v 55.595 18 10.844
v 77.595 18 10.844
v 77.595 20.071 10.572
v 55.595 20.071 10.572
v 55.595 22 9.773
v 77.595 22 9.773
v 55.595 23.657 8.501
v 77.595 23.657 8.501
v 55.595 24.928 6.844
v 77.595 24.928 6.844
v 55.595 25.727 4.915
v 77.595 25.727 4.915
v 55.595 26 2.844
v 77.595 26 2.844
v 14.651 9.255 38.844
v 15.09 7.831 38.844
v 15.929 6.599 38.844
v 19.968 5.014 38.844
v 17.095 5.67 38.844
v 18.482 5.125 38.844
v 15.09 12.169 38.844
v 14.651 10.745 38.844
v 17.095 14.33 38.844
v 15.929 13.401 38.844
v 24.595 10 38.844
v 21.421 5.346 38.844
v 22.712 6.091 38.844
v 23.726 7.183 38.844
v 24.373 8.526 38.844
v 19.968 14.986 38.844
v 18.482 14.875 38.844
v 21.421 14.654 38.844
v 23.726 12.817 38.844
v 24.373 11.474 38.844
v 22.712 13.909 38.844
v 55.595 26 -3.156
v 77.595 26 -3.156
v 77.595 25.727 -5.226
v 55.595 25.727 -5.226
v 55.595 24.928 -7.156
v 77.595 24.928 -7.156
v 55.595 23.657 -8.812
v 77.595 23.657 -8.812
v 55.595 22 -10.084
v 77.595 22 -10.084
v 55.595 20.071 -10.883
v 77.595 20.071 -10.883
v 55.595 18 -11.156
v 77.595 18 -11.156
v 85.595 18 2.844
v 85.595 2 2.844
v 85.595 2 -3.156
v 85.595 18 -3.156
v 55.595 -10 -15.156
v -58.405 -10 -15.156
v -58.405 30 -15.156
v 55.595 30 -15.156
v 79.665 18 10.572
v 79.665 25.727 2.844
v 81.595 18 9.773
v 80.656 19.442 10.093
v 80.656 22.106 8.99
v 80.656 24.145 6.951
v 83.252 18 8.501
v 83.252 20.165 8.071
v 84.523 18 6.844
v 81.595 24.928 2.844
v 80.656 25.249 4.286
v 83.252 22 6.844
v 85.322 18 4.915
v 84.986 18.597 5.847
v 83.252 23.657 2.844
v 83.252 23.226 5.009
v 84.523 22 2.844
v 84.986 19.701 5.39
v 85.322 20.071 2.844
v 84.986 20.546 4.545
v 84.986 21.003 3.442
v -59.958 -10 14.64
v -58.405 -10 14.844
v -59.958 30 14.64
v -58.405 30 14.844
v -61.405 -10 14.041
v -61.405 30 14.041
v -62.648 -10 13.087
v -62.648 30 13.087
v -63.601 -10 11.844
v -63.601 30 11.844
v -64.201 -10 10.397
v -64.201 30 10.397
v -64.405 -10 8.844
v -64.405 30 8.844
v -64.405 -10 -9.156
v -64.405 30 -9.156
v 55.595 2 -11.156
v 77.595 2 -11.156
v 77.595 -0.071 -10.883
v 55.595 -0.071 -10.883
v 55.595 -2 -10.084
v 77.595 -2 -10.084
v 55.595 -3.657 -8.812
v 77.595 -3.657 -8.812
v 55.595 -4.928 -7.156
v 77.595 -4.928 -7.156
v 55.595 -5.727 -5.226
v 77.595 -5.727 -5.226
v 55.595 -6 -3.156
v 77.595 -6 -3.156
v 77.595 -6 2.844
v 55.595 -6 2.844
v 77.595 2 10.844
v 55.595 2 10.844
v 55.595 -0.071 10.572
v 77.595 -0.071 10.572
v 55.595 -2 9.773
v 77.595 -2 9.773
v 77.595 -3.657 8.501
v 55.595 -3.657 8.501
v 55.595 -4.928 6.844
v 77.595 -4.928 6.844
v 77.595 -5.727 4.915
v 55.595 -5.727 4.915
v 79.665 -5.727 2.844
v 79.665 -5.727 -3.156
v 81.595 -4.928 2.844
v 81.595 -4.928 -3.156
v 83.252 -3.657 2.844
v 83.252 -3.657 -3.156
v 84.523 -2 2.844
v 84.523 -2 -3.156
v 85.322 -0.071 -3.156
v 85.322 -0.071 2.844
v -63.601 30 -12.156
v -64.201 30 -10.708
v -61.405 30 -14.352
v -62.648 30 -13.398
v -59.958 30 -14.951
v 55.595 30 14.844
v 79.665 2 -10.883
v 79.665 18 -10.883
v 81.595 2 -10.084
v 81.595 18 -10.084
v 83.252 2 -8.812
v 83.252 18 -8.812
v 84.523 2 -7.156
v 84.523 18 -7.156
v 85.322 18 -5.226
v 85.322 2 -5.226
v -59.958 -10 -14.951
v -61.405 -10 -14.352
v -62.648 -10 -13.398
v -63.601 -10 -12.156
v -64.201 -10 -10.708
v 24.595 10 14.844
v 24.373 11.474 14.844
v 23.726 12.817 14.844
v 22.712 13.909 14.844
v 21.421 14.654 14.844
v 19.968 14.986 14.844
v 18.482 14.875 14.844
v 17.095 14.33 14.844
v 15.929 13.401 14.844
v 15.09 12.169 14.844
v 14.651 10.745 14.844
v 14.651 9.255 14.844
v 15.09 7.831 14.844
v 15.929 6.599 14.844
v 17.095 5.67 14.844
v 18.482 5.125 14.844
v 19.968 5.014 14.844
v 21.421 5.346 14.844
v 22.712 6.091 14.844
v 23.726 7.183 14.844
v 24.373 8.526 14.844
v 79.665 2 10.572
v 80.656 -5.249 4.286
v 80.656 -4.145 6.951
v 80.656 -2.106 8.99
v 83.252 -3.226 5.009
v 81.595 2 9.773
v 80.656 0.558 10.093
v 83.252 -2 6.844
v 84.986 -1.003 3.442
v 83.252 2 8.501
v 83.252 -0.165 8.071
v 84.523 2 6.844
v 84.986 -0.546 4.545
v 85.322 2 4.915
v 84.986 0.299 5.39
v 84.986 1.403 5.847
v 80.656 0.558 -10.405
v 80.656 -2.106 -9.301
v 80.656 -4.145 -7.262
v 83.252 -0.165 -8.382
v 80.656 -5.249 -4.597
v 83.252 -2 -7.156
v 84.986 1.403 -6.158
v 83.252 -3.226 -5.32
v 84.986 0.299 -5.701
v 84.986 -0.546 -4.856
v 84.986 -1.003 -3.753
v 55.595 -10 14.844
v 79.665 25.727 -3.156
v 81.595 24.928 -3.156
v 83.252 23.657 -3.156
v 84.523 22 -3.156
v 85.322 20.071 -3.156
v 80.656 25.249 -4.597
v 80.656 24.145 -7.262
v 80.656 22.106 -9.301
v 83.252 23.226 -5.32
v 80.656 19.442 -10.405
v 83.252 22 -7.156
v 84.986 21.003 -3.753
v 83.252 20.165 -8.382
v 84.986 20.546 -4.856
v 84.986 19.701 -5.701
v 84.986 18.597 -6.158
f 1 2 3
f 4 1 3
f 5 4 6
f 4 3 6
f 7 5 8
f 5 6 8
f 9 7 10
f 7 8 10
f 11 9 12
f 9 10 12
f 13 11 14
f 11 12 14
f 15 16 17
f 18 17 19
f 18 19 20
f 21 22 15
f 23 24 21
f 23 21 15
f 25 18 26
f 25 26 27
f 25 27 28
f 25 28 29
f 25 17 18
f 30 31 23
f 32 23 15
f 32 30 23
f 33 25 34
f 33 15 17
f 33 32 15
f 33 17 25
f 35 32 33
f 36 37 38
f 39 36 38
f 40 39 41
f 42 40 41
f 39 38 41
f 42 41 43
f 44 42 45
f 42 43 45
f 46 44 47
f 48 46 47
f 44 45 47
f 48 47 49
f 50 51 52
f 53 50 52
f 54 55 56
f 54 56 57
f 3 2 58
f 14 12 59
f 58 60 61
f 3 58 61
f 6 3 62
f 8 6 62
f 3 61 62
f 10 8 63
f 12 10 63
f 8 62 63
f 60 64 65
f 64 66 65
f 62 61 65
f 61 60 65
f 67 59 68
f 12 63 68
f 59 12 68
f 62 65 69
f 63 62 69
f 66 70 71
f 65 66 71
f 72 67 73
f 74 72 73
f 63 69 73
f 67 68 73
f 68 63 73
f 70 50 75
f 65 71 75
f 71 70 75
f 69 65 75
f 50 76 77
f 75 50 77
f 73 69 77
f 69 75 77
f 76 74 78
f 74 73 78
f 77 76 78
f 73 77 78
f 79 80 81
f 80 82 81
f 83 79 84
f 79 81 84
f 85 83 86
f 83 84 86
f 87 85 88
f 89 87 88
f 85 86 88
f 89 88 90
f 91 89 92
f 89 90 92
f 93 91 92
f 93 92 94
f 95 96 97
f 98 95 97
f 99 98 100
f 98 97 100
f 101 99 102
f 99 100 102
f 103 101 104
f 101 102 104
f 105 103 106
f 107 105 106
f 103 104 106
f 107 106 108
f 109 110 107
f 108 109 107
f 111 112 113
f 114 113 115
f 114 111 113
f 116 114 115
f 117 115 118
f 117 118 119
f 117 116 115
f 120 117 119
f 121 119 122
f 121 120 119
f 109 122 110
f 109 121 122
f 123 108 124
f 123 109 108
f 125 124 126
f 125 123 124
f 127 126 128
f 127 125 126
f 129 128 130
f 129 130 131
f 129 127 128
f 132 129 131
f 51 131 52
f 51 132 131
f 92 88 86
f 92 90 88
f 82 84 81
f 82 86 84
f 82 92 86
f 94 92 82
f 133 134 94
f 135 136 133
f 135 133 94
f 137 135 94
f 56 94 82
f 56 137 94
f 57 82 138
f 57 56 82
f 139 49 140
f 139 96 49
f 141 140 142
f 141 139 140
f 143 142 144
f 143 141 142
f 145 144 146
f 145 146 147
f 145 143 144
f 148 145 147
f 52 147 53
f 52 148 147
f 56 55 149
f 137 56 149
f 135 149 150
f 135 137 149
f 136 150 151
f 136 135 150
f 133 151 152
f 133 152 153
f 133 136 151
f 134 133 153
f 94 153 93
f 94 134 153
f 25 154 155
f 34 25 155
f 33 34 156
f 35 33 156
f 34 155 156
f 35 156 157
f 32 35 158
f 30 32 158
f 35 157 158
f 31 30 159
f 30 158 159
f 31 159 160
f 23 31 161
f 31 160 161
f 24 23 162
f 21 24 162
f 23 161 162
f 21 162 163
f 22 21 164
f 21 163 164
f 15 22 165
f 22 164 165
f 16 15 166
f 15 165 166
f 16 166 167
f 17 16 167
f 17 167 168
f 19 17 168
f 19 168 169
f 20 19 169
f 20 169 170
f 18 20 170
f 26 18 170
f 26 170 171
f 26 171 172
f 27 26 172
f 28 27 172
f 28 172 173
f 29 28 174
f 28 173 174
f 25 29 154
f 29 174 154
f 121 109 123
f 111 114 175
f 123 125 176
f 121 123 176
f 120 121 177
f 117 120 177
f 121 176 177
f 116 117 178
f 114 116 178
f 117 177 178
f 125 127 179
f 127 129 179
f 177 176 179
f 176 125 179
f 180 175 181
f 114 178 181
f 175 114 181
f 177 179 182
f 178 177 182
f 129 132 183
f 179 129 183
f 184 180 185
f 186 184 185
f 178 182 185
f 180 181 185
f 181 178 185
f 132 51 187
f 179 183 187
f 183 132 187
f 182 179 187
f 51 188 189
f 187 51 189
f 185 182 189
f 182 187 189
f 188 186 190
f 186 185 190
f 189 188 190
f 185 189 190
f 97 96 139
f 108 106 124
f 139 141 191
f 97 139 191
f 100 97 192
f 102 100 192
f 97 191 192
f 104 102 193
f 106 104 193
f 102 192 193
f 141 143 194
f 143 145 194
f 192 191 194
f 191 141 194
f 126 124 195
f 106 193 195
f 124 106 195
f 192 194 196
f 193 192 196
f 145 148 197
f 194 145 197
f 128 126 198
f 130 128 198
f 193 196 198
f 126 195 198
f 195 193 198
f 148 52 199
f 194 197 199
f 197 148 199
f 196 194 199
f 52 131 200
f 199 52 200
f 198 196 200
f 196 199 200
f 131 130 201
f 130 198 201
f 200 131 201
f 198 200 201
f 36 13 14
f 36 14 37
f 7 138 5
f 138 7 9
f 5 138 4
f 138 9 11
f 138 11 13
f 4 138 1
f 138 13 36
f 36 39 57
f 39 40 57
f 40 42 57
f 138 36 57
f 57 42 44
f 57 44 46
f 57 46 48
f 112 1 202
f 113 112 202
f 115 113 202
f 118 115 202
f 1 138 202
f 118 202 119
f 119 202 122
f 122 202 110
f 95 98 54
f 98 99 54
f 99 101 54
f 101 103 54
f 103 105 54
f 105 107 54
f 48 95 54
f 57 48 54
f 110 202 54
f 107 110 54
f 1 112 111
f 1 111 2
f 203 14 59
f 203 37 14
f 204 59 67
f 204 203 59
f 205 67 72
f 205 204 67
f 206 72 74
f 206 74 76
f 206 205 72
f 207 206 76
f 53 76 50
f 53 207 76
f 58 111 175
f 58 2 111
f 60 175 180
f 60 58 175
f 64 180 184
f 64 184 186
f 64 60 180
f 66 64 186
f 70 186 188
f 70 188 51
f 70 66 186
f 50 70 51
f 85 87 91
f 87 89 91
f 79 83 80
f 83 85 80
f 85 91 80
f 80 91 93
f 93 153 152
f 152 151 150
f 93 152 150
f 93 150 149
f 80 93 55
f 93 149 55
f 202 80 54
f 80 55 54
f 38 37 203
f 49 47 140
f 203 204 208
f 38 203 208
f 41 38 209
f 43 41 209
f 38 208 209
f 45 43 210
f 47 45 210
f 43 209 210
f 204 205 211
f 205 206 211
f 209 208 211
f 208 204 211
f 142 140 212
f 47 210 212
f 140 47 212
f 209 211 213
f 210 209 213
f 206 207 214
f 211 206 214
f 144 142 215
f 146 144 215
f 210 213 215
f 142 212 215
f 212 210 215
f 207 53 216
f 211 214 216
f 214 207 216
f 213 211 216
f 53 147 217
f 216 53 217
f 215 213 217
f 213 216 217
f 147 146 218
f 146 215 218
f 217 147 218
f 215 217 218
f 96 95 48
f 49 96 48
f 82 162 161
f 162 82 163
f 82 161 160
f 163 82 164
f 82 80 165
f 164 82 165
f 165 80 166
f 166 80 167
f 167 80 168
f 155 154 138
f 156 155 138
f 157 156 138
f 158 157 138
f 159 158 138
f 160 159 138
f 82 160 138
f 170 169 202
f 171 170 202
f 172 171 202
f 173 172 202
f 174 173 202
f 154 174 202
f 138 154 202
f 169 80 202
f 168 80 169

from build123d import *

# Parameters (mm, degrees)
CROQUIS1_W              = 60
CROQUIS1_H              = 15
SALIENTE_EXTRUIR1_DEPTH = 20
CROQUIS2_R              = 2.5
SALIENTE_EXTRUIR2_DEPTH = 12
CROQUIS3_W              = 11
CROQUIS3_H              = 16
SALIENTE_EXTRUIR3_DEPTH = 15
REDONDEO1_R             = 4
REDONDEO2_R             = 4
REDONDEO3_R             = 3
ESCALA1_SCALE           = 2


with BuildPart() as part:
    # Croquis1 → Saliente-Extruir1 (new body)
    with BuildSketch(Plane(origin=(0, 0, 0), x_dir=(1, 0, 0), z_dir=(0, 1, 0))):
        Rectangle(CROQUIS1_W, CROQUIS1_H)
    extrude(amount=SALIENTE_EXTRUIR1_DEPTH)

    # Croquis2 → Saliente-Extruir2 (add)
    with BuildSketch(Plane.XY.offset(7.5)):
        with Locations((12, 10)):
            Circle(CROQUIS2_R)
    extrude(amount=SALIENTE_EXTRUIR2_DEPTH)

    # Croquis3 → Saliente-Extruir3 (add)
    with BuildSketch(Plane(origin=(30, 0, 0), x_dir=(0, 0, -1), z_dir=(1, 0, 0))):
        with Locations((0, 10)):
            Rectangle(CROQUIS3_W, CROQUIS3_H)
    extrude(amount=SALIENTE_EXTRUIR3_DEPTH)

    # Redondeo1
    redondeo1_edges = [part.edges().sort_by_distance(p)[0] for p in [
        (37.5, 18, 5.5),
        (37.5, 2, 5.5),
        (37.5, 2, -5.5),
        (37.5, 18, -5.5),
    ]]
    fillet(redondeo1_edges, radius=REDONDEO1_R)

    # Redondeo2
    redondeo2_edges = [part.edges().sort_by_distance(p)[0] for p in [
        (45, 18, 0),
        (45, 10, -5.5),
        (45, 10, 5.5),
        (45, 2, 0),
        (45, 16.828427125, 4.328427125),
        (45, 3.171572875, 4.328427125),
        (45, 3.171572875, -4.328427125),
        (45, 16.828427125, -4.328427125),
    ]]
    fillet(redondeo2_edges, radius=REDONDEO2_R)

    # Redondeo3
    redondeo3_edges = [part.edges().sort_by_distance(p)[0] for p in [
        (-30, 10, -7.5),
        (-30, 10, 7.5),
    ]]
    fillet(redondeo3_edges, radius=REDONDEO3_R)


with BuildPart() as part_1:
    # Escala1: scaled about (4.405278124, 10, 0.15554504)
    add(part.part.scale(ESCALA1_SCALE).moved(Location((-4.405278124, -10, -0.15554504))))


solid = part_1.part
